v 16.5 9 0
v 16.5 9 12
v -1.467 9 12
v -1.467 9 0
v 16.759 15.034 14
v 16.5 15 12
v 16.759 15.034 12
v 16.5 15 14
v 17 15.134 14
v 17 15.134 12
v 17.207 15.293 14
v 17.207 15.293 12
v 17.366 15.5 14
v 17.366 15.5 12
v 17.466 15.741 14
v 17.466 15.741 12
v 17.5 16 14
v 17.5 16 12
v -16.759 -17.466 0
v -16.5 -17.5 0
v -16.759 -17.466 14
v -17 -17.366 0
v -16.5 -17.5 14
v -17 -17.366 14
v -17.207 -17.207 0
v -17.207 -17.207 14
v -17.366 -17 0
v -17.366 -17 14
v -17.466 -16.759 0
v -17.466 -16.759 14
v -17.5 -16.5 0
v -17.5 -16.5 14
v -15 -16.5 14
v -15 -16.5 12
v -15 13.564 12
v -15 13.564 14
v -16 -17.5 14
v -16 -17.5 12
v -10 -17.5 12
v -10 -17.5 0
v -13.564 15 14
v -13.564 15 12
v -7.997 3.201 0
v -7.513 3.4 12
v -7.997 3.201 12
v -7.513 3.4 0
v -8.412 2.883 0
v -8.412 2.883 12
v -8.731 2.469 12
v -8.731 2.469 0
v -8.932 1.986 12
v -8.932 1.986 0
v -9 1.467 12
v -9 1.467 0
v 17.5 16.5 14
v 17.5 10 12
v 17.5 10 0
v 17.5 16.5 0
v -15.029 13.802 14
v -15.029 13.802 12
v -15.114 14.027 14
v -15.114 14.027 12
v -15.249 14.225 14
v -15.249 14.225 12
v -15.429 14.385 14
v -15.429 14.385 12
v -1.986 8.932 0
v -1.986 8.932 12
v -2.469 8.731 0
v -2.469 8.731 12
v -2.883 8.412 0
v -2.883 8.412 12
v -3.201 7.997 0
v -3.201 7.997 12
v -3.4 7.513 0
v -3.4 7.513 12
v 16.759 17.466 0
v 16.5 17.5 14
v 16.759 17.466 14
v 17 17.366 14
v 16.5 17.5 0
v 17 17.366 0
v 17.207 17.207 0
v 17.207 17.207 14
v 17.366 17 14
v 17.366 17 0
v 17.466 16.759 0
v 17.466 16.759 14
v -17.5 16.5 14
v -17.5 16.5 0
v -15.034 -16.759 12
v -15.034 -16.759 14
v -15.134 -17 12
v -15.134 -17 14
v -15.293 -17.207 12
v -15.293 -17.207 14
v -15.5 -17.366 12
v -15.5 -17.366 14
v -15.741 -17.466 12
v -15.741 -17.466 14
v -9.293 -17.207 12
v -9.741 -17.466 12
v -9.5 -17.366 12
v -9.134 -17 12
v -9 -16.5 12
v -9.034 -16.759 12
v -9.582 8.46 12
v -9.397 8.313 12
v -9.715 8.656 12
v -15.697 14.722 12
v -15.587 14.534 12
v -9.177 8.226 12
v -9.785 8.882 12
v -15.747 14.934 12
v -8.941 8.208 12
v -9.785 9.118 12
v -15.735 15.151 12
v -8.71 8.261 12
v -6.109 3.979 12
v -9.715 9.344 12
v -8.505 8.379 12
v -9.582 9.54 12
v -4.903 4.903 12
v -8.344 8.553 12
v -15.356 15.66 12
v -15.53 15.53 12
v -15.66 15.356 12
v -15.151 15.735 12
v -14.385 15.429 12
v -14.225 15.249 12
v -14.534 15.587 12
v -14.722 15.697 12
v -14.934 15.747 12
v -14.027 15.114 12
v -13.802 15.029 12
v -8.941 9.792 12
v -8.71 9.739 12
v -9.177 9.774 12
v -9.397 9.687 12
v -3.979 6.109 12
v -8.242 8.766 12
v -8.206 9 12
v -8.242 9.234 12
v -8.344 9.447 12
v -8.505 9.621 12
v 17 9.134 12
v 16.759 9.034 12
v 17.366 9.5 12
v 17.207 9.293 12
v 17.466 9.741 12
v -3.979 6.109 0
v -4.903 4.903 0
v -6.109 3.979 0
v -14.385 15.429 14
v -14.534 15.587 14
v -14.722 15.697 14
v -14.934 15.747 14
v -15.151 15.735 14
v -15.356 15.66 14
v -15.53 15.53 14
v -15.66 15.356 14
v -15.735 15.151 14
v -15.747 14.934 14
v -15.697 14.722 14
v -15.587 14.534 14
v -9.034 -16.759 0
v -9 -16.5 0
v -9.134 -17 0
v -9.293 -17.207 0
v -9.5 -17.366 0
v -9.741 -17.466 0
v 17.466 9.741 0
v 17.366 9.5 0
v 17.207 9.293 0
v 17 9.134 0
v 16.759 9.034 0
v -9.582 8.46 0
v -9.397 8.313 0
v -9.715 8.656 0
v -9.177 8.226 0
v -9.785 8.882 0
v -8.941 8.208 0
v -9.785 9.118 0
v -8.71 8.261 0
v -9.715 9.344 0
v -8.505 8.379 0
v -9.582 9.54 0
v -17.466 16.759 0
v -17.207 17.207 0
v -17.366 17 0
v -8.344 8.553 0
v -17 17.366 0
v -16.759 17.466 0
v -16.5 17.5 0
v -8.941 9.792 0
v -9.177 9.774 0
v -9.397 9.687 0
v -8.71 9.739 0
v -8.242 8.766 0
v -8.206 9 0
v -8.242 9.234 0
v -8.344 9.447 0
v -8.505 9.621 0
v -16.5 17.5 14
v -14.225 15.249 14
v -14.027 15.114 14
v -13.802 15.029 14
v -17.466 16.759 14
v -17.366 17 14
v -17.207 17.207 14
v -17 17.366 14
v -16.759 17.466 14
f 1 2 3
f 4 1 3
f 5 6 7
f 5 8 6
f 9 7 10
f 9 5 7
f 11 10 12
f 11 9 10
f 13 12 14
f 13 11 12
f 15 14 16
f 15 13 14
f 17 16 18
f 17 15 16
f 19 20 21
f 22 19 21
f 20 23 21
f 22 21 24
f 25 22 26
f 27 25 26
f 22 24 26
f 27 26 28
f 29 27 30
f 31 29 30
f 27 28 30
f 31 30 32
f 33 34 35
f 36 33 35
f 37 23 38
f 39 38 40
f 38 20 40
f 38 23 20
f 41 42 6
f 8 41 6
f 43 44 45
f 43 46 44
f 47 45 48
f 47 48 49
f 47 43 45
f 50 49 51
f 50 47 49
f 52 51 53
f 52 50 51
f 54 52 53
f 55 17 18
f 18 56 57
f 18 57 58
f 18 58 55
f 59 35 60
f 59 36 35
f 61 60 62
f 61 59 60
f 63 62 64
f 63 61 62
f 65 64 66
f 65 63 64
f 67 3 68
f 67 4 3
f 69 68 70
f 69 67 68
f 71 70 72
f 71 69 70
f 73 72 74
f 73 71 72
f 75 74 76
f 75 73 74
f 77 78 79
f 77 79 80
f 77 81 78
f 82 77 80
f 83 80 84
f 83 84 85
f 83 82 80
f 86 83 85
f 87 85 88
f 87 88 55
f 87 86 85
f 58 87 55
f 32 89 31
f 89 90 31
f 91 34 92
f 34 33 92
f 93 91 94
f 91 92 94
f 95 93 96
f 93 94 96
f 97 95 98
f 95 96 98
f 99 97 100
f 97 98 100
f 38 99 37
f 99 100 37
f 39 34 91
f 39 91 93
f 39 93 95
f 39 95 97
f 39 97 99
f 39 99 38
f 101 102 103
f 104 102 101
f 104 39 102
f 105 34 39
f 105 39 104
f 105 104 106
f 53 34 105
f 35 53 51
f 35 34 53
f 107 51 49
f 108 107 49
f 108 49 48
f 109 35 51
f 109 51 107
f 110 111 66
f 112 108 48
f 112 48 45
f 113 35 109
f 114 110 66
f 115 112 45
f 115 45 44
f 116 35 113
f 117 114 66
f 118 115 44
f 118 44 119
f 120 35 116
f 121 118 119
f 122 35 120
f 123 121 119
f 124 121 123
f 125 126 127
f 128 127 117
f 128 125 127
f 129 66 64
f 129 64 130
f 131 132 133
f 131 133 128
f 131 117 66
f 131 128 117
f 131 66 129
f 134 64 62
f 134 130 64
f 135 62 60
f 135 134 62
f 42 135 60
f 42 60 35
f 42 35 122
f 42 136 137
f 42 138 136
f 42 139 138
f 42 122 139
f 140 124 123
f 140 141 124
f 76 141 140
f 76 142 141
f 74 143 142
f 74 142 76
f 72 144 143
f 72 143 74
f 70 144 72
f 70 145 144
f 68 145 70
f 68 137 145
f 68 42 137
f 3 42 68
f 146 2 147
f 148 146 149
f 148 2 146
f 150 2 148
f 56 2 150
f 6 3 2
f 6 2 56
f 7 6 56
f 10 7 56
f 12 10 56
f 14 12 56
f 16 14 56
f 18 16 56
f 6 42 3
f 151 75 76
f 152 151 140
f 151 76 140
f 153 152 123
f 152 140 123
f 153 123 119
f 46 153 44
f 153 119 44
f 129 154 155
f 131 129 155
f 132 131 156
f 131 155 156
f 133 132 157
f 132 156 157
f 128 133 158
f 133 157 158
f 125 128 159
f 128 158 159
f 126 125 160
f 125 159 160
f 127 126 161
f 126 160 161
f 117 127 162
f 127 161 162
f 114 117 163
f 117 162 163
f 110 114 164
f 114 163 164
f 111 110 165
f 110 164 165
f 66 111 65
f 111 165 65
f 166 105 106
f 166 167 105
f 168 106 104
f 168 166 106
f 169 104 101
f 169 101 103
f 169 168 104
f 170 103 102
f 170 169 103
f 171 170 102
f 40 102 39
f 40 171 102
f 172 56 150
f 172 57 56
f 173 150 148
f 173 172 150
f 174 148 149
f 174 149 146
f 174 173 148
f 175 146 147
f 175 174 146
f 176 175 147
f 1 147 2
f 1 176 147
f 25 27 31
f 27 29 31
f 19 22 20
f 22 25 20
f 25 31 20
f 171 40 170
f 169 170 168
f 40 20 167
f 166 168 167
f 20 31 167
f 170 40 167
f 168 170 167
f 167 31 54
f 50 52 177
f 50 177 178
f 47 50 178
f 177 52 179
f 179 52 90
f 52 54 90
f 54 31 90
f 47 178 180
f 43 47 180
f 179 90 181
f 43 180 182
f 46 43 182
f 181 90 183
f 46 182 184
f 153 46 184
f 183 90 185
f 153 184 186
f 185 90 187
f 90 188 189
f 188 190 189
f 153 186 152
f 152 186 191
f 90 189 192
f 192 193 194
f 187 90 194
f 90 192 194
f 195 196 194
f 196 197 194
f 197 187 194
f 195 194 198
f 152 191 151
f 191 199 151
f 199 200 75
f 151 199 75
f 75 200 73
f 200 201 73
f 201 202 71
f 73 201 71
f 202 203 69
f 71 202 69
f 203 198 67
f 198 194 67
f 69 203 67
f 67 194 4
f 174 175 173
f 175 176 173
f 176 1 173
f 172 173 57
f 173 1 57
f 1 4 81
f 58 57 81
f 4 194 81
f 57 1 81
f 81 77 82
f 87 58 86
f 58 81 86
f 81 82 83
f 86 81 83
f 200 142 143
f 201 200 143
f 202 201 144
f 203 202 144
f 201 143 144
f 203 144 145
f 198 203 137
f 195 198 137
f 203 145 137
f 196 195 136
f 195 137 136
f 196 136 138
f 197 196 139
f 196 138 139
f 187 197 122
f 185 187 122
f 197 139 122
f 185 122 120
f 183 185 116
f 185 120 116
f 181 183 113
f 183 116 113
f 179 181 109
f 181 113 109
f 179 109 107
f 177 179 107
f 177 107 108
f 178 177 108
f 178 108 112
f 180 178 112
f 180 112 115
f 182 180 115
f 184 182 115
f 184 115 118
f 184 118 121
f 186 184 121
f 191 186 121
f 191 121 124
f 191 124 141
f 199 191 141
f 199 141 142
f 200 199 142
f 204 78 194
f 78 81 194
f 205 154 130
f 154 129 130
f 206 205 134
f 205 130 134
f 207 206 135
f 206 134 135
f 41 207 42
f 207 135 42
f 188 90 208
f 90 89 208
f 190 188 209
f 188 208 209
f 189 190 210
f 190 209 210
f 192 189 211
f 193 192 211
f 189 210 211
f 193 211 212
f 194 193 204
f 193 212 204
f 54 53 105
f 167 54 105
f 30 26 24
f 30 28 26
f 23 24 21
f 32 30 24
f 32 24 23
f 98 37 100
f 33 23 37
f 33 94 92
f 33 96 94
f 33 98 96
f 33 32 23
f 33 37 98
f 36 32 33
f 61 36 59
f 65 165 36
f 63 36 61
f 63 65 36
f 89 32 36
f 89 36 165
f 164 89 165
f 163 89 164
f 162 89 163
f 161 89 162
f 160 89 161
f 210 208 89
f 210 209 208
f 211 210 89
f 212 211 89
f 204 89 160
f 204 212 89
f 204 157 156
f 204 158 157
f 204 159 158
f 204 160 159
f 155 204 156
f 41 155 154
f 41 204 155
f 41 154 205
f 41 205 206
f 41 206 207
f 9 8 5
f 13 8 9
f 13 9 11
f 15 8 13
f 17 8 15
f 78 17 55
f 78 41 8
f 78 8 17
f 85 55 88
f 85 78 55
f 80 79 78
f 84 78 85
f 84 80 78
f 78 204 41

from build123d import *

# Parameters (mm, degrees)
F0_W      = 35
F0_H      = 35
F1_DEPTH  = 12
F3_DEPTH  = 2
F4_R      = 0.79375
F5_DEPTH  = 12.001
F7_DEPTH  = 12.001
F8_R      = 0.75
F9_DEPTH  = 2
F10_R     = 2
F12_DEPTH = 12.001
F13_R     = 1


with BuildPart() as f1:
    # F0 (on Top) → F1 (new body)
    with BuildSketch(Plane.XY):
        Rectangle(F0_W, F0_H)
    extrude(amount=F1_DEPTH)

    # F2 (on face) → F3 (join)
    with BuildSketch(Plane.XY.offset(12)):
        Polygon((17.5, 17.5), (-17.5, 17.5), (-17.5, -17.5), (-15, -17.5), (-15, 15), (17.5, 15), align=None)
    extrude(amount=F3_DEPTH)

    # F4 (on face) → F5 (cut, through all)
    with BuildSketch(Plane.XY.offset(12)):
        with Locations((-9, 9)):
            Circle(F4_R)
    extrude(amount=-F5_DEPTH, mode=Mode.SUBTRACT)

    # F6 (on face) → F7 (cut, through all)
    with BuildSketch(Plane.XY.offset(12)):
        with BuildLine():
            Line((12.5, 9), (-3.20625, 9))
            ThreePointArc((-3.20625, 9), (-4.9032000865, 4.9032000865), (-9, 3.20625))
            Line((-9, 3.20625), (-9, -12.5))
            Line((-9, -12.5), (12.5, -12.5))
            Line((12.5, -12.5), (12.5, 9))
        make_face()
    extrude(amount=-F7_DEPTH, mode=Mode.SUBTRACT)

    # F8 (on face) → F9 (cut, through all)
    with BuildSketch(Plane.XY.offset(14)):
        with Locations((-15, 15)):
            Circle(F8_R)
    extrude(amount=-F9_DEPTH, mode=Mode.SUBTRACT)

    # F10
    f10_edges = [f1.edges().sort_by_distance(p)[0] for p in [
        (-3.20625, 9, 6),
        (-9, 3.20625, 6),
        (12.5, 9, 6),
        (12.5, -12.5, 6),
        (-9, -12.5, 6),
    ]]
    fillet(f10_edges, radius=F10_R)

    # F11 (on face) → F12 (cut, through all)
    with BuildSketch(Plane.XY.offset(12)):
        Polygon((10.5, 9), (-9, -10.5), (-9, -17.5), (17.5, -17.5), (17.5, 9), align=None)
    extrude(amount=-F12_DEPTH, mode=Mode.SUBTRACT)

    # F13
    f13_edges = [f1.edges().sort_by_distance(p)[0] for p in [
        (17.5, 17.5, 7),
        (-17.5, -17.5, 7),
        (-17.5, 17.5, 7),
        (-15, -17.5, 13),
        (17.5, 15, 13),
        (-15, 14.25, 13),
        (-14.25, 15, 13),
        (-9, -17.5, 6),
        (17.5, 9, 6),
    ]]
    fillet(f13_edges, radius=F13_R)


solid = f1.part
